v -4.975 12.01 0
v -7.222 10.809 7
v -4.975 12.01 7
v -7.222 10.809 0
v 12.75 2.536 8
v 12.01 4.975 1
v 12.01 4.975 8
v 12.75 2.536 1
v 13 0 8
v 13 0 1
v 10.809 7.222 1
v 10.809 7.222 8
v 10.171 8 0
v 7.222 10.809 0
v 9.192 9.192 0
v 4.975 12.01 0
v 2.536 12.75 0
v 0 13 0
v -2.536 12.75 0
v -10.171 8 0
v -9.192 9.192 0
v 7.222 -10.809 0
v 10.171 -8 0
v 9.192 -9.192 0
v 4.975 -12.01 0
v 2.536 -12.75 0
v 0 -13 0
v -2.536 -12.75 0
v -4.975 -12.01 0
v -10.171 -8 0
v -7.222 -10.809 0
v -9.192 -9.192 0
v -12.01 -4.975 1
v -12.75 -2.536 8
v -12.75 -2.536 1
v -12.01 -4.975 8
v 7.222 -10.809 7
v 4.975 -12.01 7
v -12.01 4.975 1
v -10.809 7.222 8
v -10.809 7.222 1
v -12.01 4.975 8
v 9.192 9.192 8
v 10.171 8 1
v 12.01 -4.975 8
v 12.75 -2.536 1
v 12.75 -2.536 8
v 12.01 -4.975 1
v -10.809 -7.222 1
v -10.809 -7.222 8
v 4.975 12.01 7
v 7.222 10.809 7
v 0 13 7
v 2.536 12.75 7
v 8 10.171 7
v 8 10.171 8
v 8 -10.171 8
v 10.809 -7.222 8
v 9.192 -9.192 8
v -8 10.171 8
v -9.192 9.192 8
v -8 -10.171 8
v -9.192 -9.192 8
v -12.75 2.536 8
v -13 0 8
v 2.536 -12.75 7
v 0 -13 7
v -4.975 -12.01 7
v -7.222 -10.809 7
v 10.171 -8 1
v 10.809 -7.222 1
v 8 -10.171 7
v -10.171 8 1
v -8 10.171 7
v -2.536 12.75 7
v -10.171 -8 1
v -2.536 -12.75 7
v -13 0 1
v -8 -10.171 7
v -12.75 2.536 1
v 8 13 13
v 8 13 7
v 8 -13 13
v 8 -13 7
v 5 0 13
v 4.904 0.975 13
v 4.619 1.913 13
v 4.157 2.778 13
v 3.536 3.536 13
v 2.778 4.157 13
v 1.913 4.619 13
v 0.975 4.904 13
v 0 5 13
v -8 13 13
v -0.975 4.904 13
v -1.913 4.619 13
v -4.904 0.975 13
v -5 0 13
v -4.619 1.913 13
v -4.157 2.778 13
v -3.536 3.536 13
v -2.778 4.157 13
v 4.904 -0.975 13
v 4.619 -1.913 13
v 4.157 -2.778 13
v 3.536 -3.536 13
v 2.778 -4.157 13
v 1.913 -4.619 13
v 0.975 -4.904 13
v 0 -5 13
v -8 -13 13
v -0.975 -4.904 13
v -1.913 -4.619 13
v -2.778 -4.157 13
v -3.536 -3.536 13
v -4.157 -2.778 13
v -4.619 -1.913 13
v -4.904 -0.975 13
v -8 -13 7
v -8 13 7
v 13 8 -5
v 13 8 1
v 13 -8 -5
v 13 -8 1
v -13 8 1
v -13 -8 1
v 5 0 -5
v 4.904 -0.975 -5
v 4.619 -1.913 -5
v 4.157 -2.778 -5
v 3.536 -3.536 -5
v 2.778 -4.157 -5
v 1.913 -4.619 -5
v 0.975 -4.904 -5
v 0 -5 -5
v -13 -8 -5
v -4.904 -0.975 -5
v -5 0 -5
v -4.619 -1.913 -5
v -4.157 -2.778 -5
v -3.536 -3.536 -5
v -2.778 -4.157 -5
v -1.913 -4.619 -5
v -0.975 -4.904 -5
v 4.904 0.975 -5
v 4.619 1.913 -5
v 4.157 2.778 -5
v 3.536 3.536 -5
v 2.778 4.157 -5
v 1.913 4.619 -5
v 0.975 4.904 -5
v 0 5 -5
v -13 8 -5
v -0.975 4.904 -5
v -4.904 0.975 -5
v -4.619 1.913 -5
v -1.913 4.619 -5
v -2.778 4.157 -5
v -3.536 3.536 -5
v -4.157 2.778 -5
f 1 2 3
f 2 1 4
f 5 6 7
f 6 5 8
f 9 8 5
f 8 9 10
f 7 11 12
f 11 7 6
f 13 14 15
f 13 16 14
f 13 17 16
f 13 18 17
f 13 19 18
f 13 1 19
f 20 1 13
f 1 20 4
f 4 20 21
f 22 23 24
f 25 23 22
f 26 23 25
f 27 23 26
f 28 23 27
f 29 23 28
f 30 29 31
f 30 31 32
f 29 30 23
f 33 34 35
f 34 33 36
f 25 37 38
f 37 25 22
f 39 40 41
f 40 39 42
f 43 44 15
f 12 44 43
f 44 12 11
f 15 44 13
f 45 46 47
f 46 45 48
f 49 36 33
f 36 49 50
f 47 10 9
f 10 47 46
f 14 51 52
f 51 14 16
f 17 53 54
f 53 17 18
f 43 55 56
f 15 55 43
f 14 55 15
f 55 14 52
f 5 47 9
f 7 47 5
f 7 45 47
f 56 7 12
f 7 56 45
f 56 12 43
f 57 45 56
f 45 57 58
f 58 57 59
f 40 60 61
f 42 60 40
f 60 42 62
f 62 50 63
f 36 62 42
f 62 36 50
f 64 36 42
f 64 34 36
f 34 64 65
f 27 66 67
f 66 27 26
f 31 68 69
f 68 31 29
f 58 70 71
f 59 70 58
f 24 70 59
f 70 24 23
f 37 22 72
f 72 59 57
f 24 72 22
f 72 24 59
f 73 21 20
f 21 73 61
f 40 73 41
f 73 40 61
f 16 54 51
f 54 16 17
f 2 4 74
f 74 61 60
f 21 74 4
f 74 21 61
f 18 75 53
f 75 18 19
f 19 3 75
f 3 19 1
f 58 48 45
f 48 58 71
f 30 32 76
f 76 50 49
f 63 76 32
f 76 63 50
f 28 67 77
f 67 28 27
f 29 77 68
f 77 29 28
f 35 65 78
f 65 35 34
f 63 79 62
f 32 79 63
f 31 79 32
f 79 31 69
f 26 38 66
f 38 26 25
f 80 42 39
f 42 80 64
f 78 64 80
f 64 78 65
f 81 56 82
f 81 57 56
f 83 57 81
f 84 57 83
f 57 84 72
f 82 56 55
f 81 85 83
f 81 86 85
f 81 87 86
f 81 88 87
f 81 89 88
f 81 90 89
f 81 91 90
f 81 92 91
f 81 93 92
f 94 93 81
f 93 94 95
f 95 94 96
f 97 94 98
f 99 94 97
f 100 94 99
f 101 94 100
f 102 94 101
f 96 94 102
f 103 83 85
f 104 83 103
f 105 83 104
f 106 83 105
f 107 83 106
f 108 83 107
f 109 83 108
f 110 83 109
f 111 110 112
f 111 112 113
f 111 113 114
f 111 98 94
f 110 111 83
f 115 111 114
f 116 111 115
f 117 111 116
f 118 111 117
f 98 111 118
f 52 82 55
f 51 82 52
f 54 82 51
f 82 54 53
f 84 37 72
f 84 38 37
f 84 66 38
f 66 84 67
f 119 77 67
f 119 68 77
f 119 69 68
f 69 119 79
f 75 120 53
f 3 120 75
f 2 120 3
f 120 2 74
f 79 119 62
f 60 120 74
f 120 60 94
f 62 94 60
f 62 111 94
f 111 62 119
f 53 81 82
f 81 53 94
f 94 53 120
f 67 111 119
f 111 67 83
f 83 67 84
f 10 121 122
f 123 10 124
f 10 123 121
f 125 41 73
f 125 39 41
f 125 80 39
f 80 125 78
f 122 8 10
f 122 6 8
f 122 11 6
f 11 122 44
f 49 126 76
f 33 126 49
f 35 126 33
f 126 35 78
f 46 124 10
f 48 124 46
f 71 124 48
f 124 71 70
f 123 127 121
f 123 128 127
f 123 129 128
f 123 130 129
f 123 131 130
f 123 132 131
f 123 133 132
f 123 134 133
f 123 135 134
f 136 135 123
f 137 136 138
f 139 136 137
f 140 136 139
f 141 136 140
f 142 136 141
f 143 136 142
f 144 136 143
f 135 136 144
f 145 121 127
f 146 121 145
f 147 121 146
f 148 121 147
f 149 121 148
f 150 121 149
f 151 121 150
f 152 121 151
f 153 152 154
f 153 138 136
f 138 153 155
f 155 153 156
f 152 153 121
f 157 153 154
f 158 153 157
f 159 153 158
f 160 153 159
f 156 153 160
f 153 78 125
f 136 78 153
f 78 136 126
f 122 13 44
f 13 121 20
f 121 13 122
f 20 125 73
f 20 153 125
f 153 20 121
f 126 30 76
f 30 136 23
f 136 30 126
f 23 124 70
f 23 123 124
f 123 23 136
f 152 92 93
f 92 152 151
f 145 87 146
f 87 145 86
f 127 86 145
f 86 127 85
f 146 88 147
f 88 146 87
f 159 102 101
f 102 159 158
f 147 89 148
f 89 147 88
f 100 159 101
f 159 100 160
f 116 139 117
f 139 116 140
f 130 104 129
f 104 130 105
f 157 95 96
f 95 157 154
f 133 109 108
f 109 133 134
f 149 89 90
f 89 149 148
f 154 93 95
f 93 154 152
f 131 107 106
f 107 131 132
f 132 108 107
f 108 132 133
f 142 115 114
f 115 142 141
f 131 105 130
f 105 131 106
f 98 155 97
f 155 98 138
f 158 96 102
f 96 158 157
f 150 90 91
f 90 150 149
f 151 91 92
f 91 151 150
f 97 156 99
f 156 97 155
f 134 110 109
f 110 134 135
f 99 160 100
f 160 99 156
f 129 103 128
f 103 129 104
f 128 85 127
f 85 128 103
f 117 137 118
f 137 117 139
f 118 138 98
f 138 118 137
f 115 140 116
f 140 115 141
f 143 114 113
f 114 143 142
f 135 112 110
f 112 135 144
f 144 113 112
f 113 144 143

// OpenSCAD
$fn = 32;

// ----------------------------------------------------------------------
// Oldham coupling disc: 26 x 18 mm
// ----------------------------------------------------------------------

// --- parameters (mm) ---
disc_d = 26;              // disc diameter
disc_t = 8;               // disc thickness
tongue_w = 16;            // tongue width
tongue_h = 5;             // tongue height
bore_d = 10;              // centre lightening bore

module disc() {
  cylinder(h = disc_t, d = disc_d);
  /* tongue on the top face, sunk 1 mm into the disc */
  translate([-tongue_w / 2, -disc_d / 2, disc_t - 1]) cube([tongue_w, disc_d, tongue_h + 1]);
  /* slot wall on the bottom face, 90 degrees turned */
  translate([-disc_d / 2, -tongue_w / 2, -tongue_h]) cube([disc_d, tongue_w, tongue_h + 1]);
}

difference() {
  disc();
  translate([0, 0, -tongue_h - 1]) cylinder(h = disc_t + 2 * tongue_h + 2, d = bore_d);
}
